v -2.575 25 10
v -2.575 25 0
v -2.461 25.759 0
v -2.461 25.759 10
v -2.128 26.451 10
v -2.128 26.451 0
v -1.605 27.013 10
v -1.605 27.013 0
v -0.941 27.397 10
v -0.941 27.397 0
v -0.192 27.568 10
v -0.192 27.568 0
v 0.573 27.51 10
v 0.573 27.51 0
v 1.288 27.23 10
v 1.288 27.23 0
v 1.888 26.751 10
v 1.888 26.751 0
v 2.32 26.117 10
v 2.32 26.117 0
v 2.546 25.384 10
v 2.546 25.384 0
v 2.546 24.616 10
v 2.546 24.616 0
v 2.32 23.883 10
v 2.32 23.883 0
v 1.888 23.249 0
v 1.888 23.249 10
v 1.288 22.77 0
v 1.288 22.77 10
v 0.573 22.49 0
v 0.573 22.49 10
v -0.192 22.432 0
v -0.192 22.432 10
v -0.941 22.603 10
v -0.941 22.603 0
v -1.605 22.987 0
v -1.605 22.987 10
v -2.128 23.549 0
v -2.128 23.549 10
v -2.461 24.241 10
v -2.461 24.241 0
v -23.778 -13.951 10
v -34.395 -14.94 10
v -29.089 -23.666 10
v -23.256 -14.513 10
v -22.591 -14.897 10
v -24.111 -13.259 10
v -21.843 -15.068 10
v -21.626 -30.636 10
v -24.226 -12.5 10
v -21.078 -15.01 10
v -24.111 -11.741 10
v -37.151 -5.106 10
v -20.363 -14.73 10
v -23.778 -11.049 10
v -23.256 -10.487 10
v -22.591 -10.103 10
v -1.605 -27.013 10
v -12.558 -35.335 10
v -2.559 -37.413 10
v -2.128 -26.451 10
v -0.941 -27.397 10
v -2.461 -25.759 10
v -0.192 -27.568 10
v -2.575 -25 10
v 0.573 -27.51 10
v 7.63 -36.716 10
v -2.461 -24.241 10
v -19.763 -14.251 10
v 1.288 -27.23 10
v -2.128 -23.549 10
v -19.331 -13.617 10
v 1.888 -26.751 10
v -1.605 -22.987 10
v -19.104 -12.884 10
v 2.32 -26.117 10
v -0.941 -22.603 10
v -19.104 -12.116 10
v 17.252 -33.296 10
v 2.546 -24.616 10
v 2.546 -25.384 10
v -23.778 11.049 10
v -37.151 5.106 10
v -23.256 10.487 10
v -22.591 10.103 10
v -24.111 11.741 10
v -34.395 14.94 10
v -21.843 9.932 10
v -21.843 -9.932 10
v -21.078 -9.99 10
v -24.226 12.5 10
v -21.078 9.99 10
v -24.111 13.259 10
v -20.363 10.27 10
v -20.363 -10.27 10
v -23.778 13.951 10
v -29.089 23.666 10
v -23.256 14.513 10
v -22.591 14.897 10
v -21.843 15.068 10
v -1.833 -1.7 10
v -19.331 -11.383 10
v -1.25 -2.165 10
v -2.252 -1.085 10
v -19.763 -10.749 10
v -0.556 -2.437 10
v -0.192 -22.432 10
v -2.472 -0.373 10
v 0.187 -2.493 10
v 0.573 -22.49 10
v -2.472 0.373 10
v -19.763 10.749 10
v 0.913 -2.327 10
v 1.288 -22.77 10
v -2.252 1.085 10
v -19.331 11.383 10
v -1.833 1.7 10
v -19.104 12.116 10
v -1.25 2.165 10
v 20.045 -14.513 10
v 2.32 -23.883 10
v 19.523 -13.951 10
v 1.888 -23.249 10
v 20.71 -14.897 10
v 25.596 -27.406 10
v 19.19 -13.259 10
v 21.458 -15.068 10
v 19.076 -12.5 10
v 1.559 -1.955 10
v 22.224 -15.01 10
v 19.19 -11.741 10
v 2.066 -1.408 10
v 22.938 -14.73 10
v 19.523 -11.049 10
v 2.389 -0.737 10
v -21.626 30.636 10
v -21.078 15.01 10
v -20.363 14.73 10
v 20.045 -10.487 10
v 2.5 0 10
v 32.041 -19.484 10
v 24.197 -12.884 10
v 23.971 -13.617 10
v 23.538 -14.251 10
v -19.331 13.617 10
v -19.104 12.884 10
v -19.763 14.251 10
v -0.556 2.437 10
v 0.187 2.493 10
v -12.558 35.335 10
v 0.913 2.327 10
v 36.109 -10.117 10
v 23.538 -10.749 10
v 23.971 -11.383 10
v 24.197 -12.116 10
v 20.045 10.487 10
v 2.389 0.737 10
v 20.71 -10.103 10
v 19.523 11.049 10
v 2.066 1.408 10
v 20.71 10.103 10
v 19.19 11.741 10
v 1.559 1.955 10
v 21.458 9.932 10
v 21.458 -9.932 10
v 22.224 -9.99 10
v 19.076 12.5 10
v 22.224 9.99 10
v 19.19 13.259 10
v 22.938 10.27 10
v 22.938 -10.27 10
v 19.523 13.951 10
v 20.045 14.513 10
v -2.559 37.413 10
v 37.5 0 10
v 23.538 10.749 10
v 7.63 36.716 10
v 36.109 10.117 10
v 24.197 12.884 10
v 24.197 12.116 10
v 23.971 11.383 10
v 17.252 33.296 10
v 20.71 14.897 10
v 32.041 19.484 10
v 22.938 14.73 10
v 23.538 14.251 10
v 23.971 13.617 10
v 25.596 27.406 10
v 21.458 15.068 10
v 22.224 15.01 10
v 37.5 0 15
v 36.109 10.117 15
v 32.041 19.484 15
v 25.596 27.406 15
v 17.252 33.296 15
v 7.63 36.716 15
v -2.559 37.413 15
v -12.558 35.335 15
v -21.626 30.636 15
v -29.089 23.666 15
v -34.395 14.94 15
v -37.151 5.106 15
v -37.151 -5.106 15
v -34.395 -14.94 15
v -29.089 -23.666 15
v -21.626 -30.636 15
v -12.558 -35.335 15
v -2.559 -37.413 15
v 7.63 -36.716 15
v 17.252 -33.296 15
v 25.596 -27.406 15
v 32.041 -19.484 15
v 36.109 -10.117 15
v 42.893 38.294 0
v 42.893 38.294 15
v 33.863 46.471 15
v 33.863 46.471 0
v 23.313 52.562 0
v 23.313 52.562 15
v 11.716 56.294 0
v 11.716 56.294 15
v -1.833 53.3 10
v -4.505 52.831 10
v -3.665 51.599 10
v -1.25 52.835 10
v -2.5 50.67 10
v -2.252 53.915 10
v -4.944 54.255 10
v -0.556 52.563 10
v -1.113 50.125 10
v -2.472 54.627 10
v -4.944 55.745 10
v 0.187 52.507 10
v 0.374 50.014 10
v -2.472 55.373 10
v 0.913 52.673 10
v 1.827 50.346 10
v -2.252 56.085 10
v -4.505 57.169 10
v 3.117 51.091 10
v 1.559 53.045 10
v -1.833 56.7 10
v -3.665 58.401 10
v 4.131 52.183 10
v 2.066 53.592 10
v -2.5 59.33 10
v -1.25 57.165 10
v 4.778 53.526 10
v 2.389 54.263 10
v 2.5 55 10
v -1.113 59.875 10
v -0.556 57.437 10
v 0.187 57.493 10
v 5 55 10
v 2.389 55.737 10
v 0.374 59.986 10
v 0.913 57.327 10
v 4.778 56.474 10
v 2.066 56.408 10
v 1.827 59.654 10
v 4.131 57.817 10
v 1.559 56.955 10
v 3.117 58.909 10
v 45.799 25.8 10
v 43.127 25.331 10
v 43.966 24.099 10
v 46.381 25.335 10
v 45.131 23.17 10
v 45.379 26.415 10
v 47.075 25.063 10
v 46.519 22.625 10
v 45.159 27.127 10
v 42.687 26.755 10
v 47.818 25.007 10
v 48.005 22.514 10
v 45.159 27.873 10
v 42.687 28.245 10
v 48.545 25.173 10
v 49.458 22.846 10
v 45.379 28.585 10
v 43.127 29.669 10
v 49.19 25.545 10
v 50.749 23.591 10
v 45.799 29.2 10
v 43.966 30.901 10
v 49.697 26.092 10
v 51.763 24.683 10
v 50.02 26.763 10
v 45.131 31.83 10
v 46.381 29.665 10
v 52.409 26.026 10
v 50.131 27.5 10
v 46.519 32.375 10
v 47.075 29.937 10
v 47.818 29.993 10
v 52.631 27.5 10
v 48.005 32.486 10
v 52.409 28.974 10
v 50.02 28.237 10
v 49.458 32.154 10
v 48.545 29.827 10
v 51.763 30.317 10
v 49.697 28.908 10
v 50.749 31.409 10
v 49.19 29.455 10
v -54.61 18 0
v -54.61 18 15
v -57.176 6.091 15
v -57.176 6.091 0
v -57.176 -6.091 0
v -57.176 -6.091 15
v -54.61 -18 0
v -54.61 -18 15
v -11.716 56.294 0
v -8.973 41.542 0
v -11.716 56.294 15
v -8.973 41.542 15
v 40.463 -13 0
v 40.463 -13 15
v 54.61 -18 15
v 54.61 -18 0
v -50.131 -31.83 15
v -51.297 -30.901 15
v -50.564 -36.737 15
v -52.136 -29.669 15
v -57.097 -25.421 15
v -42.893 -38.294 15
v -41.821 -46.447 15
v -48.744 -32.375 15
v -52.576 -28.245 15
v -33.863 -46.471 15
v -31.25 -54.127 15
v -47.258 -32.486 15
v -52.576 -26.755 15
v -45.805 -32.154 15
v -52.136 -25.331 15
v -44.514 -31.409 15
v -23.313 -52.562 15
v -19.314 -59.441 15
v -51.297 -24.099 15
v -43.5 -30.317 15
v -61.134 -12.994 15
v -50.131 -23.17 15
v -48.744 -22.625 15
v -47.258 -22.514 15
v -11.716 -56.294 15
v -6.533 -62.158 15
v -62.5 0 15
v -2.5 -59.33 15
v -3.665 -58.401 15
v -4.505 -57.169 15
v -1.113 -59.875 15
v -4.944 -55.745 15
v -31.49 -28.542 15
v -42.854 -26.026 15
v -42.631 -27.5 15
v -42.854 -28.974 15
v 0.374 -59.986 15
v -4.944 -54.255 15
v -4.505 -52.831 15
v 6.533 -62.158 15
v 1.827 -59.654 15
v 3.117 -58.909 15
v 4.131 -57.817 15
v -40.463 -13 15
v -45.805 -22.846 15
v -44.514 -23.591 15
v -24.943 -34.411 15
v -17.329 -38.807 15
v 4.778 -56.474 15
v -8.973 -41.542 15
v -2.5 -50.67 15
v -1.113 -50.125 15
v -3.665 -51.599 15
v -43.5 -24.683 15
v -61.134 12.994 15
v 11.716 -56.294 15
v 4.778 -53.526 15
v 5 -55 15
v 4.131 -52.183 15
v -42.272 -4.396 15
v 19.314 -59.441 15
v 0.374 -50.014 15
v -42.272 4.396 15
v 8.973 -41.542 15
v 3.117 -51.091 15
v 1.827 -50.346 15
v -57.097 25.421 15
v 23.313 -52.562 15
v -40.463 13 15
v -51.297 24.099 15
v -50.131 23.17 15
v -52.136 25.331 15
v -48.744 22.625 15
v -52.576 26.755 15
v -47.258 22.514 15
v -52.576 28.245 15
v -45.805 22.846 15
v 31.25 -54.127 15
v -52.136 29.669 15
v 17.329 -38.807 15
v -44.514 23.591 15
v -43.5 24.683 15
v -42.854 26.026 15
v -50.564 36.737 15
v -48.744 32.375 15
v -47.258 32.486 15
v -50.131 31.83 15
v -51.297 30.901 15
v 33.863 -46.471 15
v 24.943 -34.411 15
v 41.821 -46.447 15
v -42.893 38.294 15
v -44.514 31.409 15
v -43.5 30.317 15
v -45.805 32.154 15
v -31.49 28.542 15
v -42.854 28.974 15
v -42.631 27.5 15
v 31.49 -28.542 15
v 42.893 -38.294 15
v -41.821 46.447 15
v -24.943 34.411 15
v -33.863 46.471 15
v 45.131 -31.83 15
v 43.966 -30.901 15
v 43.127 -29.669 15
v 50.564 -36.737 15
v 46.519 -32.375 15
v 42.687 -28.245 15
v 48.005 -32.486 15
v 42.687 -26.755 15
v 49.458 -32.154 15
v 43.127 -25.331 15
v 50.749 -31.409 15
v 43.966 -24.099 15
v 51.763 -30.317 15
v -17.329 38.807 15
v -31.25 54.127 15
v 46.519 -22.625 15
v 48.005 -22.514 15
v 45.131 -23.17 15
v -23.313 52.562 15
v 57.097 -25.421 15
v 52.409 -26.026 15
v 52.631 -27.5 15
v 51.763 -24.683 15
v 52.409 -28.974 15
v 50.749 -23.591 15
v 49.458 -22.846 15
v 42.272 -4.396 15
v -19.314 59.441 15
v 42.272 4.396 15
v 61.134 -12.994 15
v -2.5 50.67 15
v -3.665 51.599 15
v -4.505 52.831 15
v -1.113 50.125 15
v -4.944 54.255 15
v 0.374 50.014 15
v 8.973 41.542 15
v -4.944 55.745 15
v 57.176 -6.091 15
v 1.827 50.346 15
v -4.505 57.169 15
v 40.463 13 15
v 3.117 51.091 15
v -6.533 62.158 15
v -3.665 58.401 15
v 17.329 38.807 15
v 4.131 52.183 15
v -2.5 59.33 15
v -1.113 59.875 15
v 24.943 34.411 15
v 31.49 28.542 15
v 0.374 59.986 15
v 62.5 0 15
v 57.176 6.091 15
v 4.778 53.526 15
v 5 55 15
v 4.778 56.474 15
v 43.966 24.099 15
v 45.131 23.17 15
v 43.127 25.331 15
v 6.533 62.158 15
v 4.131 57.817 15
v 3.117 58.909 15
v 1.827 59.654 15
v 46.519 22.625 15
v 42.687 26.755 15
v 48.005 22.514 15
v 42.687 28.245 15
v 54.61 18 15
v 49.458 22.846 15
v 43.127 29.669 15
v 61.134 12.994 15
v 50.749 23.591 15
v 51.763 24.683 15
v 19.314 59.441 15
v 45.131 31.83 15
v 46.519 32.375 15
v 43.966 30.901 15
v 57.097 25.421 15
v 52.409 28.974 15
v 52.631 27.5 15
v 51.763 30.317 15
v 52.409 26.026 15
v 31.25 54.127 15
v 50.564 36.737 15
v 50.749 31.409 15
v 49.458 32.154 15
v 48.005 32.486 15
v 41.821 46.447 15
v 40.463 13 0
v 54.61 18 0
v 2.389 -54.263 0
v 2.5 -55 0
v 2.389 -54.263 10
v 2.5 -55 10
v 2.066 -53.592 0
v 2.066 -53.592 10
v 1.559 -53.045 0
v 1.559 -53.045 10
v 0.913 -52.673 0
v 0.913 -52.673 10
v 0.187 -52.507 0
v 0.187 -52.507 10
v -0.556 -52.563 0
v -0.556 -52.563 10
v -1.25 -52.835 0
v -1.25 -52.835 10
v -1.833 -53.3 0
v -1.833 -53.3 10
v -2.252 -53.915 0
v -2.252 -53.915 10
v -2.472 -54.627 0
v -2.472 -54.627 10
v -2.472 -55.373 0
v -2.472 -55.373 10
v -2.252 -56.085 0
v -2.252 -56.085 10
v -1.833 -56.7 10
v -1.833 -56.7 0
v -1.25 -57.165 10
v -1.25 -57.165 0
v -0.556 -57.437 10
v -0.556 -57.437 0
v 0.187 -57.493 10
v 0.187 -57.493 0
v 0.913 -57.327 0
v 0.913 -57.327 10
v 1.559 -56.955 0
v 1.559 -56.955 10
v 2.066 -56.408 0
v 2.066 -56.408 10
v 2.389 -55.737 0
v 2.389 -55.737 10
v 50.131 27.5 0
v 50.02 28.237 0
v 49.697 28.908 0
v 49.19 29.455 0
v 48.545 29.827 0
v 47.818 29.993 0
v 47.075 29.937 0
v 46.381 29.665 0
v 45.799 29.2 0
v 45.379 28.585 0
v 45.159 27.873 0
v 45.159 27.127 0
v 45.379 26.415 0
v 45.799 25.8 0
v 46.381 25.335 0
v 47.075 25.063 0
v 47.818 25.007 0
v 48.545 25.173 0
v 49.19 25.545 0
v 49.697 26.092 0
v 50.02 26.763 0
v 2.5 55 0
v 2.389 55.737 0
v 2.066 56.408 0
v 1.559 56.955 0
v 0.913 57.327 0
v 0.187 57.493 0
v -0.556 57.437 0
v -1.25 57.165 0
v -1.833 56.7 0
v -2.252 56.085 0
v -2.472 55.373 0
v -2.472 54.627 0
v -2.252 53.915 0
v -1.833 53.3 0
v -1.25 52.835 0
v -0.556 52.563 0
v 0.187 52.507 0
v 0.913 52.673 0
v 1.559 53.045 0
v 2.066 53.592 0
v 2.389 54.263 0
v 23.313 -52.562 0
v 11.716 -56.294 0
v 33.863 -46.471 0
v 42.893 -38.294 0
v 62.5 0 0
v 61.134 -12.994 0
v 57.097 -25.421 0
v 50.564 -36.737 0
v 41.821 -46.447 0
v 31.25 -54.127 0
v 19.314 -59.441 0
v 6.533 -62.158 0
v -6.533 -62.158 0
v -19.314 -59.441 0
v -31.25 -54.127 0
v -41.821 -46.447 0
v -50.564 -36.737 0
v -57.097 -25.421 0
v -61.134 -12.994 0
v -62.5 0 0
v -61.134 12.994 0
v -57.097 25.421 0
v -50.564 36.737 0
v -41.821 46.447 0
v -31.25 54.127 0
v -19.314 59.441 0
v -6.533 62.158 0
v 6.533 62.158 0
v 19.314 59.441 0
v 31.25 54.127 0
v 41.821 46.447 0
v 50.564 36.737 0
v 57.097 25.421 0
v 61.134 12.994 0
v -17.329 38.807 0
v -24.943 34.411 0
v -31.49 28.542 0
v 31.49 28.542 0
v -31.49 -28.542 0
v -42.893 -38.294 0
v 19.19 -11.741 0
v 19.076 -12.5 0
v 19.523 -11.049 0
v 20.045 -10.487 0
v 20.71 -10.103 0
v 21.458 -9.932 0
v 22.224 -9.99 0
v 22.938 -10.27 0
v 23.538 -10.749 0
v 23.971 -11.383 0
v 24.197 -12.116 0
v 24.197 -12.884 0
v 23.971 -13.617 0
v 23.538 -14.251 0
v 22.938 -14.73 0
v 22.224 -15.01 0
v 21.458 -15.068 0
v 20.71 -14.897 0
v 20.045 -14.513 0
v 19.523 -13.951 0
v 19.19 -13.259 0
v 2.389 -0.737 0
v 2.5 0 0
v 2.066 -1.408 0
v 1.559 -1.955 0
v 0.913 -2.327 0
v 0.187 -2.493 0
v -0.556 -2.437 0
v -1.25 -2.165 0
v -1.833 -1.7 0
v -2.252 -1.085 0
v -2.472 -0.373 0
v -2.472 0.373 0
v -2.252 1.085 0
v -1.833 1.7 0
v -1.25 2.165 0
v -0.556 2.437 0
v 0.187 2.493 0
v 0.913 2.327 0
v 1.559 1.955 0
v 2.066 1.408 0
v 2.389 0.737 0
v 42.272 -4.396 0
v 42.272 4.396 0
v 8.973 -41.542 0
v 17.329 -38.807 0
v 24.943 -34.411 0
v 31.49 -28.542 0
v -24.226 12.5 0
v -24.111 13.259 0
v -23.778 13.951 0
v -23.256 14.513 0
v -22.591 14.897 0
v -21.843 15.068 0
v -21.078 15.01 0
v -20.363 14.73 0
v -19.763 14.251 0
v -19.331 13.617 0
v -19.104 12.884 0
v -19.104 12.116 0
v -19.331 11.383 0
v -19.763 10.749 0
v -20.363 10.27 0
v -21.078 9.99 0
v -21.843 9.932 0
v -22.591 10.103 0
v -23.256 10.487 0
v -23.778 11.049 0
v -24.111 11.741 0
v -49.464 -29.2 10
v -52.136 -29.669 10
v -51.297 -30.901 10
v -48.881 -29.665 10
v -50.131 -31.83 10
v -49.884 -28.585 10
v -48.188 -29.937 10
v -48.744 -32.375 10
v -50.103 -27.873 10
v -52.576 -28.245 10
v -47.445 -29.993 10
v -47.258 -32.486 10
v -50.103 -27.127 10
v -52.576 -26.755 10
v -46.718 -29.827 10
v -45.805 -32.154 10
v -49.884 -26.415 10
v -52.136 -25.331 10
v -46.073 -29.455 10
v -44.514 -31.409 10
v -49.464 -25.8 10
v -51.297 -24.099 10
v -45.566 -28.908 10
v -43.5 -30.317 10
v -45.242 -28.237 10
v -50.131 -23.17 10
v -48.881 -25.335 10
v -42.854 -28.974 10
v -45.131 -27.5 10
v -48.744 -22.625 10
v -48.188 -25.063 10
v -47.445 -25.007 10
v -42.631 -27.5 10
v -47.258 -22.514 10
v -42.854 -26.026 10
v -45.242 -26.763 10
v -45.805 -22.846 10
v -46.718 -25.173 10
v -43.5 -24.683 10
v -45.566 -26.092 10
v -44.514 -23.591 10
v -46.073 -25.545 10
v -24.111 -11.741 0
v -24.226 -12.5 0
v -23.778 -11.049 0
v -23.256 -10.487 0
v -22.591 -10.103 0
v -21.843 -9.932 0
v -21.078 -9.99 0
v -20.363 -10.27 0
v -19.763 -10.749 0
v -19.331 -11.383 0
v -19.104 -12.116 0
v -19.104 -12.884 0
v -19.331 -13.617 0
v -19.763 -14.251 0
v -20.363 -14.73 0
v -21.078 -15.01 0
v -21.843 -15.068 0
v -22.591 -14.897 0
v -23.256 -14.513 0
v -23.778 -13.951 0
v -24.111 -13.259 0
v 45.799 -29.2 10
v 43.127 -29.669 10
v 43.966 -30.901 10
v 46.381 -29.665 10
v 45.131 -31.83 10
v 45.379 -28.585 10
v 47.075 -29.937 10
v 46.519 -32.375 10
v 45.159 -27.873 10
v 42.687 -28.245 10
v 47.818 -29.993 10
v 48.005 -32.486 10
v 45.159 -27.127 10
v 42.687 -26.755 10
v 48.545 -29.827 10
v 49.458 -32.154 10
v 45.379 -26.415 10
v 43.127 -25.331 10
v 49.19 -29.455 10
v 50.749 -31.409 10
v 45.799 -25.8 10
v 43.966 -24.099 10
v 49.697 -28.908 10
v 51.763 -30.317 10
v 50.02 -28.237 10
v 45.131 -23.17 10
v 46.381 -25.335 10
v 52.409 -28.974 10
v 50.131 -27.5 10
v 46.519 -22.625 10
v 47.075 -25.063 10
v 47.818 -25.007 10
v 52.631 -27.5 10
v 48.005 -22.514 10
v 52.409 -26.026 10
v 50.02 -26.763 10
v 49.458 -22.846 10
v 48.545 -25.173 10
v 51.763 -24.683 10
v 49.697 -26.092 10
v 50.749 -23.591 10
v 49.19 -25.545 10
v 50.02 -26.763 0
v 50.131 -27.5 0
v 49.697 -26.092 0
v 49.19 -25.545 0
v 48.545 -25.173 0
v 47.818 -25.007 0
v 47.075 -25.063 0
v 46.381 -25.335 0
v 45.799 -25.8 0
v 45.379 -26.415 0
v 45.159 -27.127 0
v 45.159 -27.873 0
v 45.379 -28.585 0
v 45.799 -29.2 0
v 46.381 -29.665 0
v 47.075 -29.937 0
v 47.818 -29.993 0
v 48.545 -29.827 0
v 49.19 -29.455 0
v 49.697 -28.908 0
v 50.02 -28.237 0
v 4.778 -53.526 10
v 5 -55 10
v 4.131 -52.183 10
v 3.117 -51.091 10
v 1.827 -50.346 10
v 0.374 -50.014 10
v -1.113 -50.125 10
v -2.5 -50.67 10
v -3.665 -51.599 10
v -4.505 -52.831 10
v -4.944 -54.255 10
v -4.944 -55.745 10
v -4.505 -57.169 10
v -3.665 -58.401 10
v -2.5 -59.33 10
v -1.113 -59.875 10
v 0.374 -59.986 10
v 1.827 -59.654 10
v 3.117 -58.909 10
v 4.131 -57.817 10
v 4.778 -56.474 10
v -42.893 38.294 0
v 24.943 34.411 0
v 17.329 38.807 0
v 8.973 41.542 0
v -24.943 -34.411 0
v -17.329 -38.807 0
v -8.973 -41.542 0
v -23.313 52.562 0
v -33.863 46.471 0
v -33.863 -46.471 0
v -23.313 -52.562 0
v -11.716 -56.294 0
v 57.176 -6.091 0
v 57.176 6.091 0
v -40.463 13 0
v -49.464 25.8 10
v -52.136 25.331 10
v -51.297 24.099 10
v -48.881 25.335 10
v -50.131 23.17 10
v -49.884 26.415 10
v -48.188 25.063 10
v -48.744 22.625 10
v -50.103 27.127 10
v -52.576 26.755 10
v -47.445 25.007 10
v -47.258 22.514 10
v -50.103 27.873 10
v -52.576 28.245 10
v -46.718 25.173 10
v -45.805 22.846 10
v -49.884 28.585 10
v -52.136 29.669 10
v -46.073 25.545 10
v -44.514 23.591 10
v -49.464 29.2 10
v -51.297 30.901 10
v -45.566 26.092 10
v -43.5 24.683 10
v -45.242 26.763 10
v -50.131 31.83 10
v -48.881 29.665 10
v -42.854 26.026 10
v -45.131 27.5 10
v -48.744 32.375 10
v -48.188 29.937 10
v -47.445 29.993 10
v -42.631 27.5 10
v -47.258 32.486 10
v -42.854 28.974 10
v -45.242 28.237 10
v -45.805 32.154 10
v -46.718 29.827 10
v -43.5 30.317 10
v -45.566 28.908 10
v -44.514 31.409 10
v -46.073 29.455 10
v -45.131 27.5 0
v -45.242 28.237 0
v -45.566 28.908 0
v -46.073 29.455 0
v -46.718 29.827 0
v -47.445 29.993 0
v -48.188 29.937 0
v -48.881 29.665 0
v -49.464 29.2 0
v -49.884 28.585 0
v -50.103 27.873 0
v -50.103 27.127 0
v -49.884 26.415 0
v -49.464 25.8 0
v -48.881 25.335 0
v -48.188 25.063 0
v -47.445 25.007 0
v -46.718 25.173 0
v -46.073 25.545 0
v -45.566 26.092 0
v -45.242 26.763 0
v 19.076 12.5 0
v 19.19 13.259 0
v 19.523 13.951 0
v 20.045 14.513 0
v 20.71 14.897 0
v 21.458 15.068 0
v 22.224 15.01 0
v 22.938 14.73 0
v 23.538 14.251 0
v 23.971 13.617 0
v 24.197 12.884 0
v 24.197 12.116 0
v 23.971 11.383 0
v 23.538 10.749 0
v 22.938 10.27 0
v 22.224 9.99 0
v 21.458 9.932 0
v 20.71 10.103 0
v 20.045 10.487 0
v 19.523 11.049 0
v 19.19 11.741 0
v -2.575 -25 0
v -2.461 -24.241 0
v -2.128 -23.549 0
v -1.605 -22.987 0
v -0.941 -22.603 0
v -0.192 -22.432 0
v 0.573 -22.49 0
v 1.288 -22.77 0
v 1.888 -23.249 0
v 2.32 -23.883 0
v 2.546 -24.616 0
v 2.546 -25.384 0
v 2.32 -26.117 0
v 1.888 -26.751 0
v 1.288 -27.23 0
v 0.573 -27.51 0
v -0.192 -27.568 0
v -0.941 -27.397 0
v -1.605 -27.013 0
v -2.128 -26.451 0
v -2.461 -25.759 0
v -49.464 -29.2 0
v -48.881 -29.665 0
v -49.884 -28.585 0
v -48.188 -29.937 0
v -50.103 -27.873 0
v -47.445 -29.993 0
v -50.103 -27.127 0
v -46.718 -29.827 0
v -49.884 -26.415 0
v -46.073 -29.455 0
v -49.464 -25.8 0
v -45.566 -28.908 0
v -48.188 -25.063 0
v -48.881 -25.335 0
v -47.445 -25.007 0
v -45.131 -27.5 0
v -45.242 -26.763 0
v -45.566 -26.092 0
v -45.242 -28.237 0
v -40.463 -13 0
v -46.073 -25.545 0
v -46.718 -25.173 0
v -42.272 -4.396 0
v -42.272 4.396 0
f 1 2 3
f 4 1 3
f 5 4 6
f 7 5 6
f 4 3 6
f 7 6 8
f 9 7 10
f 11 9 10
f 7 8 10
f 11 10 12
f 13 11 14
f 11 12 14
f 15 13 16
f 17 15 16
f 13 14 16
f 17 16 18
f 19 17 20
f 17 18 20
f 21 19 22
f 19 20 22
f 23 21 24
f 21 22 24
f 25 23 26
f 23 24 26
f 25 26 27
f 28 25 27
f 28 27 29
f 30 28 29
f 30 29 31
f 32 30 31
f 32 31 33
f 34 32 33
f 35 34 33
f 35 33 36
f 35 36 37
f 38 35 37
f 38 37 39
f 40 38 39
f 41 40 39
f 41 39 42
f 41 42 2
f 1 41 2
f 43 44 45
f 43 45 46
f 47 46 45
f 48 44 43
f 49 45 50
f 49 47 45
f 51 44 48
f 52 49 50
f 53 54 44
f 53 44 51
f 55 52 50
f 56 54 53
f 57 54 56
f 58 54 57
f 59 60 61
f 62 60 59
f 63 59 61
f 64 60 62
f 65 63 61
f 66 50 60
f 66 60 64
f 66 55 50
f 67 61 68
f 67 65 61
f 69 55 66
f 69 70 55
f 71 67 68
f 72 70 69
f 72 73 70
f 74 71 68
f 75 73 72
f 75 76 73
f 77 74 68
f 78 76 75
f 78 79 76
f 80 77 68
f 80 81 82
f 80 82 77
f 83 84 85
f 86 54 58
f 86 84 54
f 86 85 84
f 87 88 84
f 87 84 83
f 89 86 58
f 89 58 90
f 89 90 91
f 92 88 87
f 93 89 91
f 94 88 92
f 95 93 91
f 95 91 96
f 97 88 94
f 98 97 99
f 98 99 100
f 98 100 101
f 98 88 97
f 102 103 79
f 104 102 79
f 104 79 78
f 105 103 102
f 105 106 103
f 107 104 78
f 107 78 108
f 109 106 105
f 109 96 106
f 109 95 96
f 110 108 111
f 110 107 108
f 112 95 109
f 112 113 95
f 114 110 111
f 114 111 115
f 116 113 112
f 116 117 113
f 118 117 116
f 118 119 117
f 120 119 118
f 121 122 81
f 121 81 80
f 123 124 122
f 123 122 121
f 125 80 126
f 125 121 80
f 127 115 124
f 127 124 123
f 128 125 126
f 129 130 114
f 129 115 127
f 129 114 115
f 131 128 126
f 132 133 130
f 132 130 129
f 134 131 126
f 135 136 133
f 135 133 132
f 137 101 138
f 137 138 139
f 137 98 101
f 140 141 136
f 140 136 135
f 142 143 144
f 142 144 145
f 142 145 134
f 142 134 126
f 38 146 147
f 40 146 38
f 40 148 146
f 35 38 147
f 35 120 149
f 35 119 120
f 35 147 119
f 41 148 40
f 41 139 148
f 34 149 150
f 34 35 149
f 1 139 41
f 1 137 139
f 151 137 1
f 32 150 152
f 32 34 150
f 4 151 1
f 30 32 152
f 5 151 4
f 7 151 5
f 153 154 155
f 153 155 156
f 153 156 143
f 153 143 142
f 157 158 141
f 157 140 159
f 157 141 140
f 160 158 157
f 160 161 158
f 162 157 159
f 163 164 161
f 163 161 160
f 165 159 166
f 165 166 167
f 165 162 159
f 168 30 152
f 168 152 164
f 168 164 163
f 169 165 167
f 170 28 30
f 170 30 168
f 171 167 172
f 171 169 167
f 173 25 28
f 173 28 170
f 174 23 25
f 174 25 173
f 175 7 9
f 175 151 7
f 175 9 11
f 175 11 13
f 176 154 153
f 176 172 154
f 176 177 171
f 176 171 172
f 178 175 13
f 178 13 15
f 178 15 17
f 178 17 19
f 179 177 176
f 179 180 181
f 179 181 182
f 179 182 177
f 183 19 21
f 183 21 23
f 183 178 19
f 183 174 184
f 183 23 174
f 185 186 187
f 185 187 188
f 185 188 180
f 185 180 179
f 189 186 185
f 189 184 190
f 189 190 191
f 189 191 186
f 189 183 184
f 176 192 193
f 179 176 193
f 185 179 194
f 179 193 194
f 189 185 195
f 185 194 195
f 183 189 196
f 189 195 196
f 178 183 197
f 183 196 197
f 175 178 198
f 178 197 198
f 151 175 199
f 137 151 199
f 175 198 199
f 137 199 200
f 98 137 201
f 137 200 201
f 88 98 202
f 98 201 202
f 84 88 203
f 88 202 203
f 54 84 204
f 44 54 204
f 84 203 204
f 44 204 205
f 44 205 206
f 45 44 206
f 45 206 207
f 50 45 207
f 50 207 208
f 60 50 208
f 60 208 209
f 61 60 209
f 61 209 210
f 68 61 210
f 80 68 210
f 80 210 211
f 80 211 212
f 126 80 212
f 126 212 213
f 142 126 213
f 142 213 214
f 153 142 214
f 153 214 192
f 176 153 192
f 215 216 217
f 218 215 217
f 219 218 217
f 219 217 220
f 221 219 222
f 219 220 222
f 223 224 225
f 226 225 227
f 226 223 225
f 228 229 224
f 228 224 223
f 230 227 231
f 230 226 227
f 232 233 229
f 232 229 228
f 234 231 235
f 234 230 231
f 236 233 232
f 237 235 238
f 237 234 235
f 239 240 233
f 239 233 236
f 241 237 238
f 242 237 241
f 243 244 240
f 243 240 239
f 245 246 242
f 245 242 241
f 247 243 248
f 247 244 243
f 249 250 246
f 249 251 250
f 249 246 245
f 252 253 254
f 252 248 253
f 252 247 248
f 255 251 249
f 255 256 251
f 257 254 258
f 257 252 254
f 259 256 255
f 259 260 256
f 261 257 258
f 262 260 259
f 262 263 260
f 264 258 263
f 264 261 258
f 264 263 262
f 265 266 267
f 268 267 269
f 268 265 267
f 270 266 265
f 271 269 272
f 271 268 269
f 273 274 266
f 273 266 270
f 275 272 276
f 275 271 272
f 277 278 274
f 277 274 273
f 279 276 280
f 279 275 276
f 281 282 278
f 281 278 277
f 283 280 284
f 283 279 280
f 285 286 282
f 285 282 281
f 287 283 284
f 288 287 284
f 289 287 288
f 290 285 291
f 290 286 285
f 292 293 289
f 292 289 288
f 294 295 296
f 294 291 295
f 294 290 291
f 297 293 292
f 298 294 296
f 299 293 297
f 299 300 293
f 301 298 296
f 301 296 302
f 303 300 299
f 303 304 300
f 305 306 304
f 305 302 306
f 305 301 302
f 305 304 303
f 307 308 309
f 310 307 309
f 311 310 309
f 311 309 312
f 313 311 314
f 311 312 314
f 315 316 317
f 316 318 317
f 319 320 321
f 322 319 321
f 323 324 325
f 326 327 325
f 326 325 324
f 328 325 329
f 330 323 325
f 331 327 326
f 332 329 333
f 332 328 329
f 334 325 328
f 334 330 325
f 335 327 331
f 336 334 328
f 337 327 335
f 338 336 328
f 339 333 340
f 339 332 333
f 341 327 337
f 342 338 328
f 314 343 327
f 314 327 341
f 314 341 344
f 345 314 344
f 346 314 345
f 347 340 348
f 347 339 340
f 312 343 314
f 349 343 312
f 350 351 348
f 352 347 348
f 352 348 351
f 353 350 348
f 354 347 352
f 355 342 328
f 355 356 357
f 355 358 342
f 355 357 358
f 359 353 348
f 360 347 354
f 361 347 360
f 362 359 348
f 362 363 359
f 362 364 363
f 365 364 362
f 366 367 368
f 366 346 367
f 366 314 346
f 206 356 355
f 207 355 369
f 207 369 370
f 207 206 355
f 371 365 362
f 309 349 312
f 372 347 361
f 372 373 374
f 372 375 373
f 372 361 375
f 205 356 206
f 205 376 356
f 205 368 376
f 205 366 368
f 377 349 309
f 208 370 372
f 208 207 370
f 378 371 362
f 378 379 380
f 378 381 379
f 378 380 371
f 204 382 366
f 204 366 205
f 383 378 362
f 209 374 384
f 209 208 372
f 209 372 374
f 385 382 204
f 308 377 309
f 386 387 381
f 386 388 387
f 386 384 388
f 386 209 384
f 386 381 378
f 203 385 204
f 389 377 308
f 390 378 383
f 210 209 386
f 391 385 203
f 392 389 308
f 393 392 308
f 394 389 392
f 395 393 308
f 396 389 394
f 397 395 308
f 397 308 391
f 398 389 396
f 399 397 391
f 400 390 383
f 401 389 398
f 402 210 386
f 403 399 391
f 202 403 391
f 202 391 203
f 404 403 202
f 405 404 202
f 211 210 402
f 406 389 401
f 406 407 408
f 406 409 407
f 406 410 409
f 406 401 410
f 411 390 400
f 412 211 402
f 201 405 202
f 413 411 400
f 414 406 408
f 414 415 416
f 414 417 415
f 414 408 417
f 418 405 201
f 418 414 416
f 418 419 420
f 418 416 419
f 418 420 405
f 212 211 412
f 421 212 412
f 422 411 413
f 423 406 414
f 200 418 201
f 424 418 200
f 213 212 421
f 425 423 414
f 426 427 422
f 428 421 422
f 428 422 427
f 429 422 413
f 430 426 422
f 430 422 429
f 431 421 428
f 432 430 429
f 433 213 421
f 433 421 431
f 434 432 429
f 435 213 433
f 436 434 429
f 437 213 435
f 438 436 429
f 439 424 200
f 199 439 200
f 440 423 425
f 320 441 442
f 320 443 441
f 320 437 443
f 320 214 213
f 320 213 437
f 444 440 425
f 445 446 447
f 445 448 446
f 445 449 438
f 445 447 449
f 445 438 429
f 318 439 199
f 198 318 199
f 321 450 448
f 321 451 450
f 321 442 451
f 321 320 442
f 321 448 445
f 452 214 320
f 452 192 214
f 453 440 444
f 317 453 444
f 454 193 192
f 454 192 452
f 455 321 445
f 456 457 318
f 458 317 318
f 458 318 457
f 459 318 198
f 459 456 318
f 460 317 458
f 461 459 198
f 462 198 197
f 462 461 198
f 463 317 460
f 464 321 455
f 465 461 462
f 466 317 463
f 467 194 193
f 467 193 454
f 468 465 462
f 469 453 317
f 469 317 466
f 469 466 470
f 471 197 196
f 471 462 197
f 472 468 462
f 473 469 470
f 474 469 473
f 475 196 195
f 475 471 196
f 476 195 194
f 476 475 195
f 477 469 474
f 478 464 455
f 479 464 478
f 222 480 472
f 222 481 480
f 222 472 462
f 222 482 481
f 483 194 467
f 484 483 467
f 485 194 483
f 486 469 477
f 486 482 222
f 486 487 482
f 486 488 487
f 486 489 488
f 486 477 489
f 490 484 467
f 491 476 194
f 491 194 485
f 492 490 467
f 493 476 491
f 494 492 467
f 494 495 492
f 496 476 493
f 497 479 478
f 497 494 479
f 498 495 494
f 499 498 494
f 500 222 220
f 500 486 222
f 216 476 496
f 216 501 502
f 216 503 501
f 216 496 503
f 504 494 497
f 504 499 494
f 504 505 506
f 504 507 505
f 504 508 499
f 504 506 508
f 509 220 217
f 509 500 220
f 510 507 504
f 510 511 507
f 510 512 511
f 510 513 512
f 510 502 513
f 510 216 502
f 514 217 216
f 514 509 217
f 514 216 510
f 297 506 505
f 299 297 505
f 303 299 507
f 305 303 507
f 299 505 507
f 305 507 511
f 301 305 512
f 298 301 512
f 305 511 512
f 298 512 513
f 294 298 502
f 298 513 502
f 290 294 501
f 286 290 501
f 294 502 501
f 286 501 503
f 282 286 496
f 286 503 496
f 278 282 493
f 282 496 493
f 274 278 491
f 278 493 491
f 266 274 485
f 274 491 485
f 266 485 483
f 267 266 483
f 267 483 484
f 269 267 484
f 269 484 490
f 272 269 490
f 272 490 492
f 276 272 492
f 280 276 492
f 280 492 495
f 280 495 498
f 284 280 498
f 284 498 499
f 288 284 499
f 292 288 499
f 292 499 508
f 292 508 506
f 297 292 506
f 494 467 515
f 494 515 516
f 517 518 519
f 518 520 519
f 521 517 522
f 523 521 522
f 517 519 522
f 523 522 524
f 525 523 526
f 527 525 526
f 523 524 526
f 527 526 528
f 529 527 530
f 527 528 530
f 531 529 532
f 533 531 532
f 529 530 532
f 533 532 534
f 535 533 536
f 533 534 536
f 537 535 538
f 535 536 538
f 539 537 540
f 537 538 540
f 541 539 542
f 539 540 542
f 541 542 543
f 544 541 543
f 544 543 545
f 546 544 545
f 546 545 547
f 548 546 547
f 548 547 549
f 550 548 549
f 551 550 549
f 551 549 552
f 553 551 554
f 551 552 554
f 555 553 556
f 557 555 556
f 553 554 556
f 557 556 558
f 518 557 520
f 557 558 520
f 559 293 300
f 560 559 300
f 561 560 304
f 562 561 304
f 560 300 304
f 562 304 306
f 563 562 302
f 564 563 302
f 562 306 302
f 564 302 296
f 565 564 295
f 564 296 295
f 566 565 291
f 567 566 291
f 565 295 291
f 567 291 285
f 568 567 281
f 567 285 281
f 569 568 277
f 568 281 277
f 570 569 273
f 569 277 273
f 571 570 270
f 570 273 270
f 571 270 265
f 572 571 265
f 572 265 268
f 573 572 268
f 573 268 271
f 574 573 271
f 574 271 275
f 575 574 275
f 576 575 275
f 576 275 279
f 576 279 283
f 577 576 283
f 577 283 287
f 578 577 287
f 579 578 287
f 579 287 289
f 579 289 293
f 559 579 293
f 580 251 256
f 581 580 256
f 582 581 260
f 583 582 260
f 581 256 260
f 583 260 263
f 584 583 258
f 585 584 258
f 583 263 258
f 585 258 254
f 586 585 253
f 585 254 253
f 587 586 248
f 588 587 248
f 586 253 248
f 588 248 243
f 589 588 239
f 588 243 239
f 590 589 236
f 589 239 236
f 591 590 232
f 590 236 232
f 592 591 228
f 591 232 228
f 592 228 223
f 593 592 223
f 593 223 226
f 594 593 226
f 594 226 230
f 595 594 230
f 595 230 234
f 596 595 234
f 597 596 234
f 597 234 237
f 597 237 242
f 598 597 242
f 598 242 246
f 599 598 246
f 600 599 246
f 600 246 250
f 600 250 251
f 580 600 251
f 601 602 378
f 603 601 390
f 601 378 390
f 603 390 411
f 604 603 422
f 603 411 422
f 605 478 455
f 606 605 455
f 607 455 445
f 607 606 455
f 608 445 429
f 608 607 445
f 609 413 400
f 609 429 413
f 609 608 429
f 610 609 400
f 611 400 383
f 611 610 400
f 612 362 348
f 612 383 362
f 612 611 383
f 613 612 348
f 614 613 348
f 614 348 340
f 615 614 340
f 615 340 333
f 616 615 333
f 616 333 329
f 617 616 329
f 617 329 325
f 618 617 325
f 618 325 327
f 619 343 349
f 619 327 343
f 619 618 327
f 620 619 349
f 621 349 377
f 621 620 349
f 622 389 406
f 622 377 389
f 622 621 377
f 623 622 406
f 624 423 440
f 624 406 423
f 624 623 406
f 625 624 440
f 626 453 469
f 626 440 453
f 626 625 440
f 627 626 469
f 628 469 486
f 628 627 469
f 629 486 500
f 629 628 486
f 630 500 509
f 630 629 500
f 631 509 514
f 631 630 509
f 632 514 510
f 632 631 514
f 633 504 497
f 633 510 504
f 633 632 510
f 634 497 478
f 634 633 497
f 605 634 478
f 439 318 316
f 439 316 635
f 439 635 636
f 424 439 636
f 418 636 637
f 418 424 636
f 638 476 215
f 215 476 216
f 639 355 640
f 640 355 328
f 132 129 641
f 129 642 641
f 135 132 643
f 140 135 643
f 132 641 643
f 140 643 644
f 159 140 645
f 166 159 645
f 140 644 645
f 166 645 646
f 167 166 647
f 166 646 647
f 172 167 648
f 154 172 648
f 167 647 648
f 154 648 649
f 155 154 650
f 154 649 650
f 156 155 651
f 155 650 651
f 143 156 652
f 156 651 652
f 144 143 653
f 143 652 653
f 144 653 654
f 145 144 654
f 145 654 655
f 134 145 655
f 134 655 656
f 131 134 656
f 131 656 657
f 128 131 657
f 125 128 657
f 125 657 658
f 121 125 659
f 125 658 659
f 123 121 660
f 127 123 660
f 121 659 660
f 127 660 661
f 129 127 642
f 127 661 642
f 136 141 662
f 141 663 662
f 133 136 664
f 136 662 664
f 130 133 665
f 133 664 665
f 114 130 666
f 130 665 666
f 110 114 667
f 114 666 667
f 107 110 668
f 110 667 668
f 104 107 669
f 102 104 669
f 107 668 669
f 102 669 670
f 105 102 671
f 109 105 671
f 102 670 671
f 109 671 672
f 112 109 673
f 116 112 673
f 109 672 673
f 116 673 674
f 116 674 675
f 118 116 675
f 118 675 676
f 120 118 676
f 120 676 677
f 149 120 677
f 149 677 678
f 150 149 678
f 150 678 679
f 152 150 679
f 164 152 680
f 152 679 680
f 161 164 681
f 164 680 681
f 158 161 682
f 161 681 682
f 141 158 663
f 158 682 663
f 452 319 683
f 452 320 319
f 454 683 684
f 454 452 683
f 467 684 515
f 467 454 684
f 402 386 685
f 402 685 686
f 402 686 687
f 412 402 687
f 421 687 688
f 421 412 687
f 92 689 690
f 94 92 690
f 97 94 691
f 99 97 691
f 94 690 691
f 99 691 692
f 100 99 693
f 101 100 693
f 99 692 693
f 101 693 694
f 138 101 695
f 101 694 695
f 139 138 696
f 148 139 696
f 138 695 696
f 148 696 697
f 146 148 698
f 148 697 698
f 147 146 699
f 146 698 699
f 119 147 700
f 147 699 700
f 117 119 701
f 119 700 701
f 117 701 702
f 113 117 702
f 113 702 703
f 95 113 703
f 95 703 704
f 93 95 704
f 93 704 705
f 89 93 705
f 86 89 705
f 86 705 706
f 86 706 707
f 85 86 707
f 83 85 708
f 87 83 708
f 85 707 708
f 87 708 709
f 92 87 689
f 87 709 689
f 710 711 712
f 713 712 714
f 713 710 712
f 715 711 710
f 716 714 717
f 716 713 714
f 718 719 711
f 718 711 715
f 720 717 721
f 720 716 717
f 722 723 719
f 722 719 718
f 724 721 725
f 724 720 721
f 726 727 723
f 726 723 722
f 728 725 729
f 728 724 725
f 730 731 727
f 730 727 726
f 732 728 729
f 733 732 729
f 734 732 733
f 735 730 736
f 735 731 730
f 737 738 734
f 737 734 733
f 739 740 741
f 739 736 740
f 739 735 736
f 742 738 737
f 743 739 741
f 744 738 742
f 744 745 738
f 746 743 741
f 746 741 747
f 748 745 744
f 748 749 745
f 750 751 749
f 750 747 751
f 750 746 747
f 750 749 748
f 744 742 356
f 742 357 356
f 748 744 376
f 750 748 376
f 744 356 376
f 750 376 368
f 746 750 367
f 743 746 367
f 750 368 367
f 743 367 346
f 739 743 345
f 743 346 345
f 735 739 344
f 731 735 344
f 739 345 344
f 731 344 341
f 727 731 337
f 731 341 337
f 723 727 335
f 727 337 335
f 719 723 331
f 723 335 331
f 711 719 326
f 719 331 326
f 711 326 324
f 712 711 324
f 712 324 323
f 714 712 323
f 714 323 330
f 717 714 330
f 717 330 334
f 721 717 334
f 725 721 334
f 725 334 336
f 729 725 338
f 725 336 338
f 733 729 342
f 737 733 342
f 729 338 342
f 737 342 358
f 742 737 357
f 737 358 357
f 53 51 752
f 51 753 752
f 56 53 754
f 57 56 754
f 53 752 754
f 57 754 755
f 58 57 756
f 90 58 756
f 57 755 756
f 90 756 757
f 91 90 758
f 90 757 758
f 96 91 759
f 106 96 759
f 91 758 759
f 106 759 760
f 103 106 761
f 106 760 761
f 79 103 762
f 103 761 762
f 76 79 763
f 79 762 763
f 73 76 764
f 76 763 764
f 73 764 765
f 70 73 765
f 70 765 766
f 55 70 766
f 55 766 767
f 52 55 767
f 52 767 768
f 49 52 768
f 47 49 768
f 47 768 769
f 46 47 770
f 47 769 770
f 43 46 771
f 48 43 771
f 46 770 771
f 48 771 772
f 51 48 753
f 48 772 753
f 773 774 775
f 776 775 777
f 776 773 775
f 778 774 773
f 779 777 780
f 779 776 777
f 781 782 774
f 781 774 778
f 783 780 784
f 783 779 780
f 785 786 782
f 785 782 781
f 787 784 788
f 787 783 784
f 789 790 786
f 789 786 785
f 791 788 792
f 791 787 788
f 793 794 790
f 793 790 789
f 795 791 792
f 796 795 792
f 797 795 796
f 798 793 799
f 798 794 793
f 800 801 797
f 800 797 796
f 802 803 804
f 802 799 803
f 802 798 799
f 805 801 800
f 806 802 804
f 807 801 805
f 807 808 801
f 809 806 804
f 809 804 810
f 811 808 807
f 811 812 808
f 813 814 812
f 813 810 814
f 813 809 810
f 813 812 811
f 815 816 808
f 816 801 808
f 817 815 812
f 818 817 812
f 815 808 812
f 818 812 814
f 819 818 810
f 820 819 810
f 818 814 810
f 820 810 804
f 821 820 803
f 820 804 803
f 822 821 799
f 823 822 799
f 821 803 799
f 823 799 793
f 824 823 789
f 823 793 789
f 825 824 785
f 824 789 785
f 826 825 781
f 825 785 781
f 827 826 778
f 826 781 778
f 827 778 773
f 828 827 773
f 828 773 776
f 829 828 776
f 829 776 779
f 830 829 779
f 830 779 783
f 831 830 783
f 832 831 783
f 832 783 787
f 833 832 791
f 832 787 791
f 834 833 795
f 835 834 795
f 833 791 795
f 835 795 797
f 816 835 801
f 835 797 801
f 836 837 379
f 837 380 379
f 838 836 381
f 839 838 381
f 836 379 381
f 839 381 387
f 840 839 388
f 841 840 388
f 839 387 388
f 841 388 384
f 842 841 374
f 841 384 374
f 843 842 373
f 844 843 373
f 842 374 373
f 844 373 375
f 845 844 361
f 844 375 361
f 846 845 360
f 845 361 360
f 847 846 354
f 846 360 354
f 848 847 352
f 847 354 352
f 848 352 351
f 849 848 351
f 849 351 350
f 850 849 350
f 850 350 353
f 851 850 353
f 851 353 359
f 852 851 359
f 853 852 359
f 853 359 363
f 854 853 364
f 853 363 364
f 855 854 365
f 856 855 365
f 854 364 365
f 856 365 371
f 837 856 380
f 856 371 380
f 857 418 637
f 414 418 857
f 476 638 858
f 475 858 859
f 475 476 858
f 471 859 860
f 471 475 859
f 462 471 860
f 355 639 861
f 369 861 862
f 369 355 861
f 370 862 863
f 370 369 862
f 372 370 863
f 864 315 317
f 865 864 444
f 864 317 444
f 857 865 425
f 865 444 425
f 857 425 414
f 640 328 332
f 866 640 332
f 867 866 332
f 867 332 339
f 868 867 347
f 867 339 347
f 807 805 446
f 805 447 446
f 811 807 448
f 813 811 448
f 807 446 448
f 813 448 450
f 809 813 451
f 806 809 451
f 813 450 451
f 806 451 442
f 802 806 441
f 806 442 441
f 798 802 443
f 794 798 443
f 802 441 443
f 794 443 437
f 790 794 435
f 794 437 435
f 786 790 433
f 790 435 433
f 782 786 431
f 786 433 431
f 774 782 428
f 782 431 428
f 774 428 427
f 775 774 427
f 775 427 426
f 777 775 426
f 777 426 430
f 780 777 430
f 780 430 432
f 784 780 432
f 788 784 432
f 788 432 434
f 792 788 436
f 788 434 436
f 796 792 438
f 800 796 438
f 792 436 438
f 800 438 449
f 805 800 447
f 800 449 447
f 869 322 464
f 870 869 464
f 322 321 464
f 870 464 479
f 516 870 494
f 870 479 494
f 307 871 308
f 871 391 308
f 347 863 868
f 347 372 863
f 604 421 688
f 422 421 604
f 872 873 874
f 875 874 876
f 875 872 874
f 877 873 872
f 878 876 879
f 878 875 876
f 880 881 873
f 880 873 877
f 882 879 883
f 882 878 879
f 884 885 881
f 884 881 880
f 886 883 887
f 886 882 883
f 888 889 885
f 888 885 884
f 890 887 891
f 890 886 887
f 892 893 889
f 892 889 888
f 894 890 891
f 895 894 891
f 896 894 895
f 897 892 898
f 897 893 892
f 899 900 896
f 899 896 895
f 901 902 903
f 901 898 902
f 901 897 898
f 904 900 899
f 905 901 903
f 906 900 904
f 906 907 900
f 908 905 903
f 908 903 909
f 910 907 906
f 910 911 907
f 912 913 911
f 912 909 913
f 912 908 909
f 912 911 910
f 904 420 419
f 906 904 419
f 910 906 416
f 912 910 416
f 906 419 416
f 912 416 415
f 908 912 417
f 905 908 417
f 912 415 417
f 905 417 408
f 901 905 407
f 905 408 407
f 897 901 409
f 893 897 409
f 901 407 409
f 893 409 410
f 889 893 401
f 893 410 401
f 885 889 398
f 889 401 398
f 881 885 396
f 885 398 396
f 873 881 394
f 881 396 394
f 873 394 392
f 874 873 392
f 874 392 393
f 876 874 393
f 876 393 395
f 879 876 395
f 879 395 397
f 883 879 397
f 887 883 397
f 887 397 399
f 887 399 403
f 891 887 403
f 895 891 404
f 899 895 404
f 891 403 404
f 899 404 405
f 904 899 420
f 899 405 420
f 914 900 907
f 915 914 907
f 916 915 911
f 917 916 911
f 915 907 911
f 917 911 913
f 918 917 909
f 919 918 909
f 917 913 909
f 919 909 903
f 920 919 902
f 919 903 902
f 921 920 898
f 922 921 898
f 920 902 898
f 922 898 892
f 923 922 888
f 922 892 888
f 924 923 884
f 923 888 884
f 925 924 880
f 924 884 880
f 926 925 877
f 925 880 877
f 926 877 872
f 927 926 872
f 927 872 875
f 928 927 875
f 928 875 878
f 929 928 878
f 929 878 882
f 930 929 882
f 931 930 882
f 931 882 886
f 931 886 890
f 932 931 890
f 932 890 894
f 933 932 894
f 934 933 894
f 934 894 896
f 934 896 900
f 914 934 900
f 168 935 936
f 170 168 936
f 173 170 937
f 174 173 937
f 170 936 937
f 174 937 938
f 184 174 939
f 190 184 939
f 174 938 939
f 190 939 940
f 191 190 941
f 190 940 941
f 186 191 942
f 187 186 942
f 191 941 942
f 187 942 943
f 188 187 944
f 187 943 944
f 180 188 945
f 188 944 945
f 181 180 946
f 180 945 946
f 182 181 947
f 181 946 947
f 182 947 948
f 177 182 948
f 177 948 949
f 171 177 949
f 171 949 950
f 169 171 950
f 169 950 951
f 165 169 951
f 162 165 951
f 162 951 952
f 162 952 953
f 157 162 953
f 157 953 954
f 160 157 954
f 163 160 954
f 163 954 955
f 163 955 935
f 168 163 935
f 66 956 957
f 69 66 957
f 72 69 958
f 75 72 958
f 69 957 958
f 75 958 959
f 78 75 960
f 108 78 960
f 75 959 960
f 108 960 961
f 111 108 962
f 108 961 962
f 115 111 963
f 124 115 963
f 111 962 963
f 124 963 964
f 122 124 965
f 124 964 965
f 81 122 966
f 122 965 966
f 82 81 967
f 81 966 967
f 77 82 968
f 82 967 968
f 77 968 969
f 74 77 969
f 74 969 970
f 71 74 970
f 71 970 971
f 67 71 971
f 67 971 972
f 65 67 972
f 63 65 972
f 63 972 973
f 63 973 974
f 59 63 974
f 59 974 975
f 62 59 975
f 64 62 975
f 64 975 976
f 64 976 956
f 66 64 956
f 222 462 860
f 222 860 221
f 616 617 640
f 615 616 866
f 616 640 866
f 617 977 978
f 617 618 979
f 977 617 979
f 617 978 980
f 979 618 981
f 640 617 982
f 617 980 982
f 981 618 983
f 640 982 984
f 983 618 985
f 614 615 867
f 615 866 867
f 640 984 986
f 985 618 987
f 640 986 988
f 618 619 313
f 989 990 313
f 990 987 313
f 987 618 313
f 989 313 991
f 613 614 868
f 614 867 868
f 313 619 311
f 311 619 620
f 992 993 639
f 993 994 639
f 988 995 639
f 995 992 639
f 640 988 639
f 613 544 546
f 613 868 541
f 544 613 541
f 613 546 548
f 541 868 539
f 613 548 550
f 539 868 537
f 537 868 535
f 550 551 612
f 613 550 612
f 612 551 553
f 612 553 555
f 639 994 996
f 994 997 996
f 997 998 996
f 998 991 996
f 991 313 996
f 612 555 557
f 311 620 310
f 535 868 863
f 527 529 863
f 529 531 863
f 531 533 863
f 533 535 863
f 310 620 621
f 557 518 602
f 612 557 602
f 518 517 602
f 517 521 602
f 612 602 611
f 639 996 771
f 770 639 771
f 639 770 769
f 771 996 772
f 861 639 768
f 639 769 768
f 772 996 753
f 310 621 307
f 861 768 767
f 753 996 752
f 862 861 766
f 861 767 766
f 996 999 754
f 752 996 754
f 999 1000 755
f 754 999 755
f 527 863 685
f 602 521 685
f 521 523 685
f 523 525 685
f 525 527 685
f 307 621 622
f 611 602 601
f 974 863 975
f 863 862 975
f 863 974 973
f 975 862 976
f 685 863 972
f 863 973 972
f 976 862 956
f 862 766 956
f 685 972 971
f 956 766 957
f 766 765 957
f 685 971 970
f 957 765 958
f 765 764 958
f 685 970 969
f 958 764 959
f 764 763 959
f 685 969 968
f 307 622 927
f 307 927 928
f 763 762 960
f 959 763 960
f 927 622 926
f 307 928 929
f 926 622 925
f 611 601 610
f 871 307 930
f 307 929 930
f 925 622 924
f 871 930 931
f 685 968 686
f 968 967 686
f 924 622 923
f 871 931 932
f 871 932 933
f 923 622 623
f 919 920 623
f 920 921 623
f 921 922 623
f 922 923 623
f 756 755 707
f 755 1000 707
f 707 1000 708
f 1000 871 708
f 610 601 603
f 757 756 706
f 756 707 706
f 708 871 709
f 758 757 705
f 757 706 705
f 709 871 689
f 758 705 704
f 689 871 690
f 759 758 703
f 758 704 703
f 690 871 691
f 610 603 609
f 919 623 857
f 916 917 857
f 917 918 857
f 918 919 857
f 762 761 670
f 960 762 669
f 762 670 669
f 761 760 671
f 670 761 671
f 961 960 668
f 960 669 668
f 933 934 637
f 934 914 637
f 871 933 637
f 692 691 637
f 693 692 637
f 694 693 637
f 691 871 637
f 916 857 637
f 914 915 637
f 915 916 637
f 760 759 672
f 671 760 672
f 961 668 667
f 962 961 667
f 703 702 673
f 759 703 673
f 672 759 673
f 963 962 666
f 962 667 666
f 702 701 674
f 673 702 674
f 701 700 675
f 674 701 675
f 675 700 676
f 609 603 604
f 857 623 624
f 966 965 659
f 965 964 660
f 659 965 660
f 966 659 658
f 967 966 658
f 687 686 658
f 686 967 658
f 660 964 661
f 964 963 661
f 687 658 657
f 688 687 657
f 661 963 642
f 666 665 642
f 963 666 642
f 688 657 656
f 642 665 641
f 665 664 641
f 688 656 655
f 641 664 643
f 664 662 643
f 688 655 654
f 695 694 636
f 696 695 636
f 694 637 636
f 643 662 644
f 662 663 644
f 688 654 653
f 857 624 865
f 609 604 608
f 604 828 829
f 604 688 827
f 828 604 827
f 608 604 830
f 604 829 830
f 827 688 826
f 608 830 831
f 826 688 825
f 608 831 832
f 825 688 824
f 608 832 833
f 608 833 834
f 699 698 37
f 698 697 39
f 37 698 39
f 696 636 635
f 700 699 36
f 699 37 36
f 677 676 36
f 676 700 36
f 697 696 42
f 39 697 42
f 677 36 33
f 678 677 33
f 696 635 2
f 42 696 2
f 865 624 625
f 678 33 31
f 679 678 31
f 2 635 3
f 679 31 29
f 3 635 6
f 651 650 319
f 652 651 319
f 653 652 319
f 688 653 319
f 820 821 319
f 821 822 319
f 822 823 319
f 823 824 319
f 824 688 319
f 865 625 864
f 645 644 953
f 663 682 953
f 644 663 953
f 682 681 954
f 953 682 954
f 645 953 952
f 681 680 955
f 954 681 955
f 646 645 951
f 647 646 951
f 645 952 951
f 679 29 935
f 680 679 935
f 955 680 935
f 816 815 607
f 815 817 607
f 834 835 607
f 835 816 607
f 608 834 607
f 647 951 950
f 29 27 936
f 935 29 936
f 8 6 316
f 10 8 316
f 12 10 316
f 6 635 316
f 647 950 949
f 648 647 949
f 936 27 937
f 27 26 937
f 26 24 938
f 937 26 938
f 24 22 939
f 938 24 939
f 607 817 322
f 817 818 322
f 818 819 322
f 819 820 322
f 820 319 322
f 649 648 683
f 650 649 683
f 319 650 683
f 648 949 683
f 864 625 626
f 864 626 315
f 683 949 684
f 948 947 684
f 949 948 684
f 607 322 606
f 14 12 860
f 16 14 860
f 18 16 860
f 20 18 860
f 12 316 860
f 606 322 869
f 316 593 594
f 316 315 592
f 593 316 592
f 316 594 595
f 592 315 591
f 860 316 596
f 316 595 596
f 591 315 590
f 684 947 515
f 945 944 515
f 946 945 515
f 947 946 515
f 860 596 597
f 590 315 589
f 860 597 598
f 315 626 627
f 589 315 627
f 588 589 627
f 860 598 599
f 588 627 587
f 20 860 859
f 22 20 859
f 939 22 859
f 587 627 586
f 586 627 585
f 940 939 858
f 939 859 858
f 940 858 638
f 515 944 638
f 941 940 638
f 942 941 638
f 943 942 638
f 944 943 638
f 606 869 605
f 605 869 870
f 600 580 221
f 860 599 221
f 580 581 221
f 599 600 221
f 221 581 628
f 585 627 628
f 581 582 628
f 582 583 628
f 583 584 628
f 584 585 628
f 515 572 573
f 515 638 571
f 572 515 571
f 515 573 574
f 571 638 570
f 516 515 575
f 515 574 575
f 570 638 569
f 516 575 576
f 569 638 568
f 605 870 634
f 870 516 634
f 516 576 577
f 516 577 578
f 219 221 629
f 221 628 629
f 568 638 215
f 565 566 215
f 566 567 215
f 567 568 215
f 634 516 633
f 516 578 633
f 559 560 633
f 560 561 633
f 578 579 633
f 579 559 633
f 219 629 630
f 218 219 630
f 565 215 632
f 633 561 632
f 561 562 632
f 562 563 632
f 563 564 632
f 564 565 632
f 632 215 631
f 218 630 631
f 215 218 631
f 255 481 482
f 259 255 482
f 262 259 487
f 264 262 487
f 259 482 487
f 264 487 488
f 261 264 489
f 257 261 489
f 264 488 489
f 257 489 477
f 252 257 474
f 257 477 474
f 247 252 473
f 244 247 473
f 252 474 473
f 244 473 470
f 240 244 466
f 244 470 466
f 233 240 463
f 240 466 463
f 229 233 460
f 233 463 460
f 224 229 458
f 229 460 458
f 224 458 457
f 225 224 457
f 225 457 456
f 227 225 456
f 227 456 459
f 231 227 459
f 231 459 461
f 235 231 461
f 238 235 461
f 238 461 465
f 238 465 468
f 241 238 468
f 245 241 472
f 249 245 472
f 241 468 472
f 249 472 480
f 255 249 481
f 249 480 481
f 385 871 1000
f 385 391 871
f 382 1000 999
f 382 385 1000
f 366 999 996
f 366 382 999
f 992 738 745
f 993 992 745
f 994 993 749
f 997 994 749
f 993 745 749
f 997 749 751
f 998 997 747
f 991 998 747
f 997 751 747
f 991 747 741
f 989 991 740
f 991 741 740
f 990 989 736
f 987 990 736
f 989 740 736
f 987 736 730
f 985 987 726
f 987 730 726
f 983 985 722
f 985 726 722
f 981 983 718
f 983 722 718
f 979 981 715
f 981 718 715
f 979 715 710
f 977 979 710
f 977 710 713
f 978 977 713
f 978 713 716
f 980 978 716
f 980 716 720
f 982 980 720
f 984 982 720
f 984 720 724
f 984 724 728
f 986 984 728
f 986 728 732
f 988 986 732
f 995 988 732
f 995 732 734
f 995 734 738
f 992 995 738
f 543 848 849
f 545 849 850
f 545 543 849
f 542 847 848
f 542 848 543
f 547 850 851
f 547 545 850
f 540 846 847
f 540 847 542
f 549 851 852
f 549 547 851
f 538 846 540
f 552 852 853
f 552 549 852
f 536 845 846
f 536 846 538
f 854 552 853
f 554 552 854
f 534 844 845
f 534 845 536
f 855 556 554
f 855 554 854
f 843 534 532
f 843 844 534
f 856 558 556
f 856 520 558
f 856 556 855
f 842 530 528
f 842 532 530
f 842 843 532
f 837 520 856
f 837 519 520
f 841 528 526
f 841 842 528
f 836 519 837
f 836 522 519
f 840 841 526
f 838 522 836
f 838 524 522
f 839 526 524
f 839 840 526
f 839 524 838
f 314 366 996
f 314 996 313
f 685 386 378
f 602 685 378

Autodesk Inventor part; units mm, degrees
ref_plane "YZ Plane" through (0, 0, 0) normal (1, 0, 0) x (0, 1, 0)
ref_plane "XZ Plane" through (0, 0, 0) normal (0, 1, 0) x (-1, 0, 0)
ref_plane "XY Plane" through (0, 0, 0) normal (0, 0, 1) x (1, 0, 0)
sketch "Sketch2" plane through (0, 0, 0) normal (0, 0, 1) x (1, 0, 0)
  circle A0 centre (0, 0) radius 62.5
  circle A1 centre (0, 0) radius 2.5
  dimension "d0" = 125
  dimension "d1" = 5
extrude "Extrusion1" add sketch "Sketch2" along normal blind 15
sketch "Sketch4" plane through (0, 0, 0) normal (0, 0, -1) x (-1, 0, 0)
  circle A0 centre (0, 25) radius 2.575
  circle A1 centre (-21.6506, 12.5) radius 2.575
  circle A2 centre (-21.6506, -12.5) radius 2.575
  circle A3 centre (0, -25) radius 2.575
  circle A4 centre (21.6506, -12.5) radius 2.575
  circle A5 centre (21.6506, 12.5) radius 2.575
  point P0 (0, 0)
  dimension "d8" = 5.15
  dimension "d9" = 25
  dimension "d12" = 360
extrude "Extrusion3" cut sketch "Sketch4" against normal through all
sketch "Sketch5" plane through (0, 0, 15) normal (0, 0, 1) x (1, 0, 0)
  circle A0 centre (0, 0) radius 37.5
  dimension "d16" = 75
extrude "Extrusion4" cut sketch "Sketch5" against normal blind 5
sketch "Sketch6" plane through (0, 0, 15) normal (0, 0, 1) x (1, 0, 0)
  circle A0 centre (0, 55) radius 2.5
  circle A1 centre (-47.6314, 27.5) radius 2.5
  circle A2 centre (-47.6314, -27.5) radius 2.5
  circle A3 centre (0, -55) radius 2.5
  circle A4 centre (47.6314, -27.5) radius 2.5
  circle A5 centre (47.6314, 27.5) radius 2.5
  point P0 (0, 0)
  dimension "d19" = 5
  dimension "d20" = 55
  dimension "d23" = 360
extrude "Extrusion5" cut sketch "Sketch6" against normal through all
sketch "Sketch8" plane through (0, 0, 15) normal (0, 0, 1) x (1, 0, 0)
  circle A0 centre (0, 0) radius 37.5 projected
  circle A1 centre (0, 0) radius 62.5 projected
  circle A2 centre (0, 55) radius 2.5 projected
  circle A3 centre (0, 55) radius 5
  circle A4 centre (-47.6314, 27.5) radius 5
  circle A5 centre (-47.6314, -27.5) radius 5
  circle A6 centre (0, -55) radius 5
  circle A7 centre (47.6314, -27.5) radius 5
  circle A8 centre (47.6314, 27.5) radius 5
  point P0 (-56.2917, 32.5)
  point P1 (-56.2917, -32.5)
  point P2 (0, -65)
  point P3 (56.2917, -32.5)
  point P4 (56.2917, 32.5)
  dimension "d28" = 10
  dimension "d31" = 360
extrude "Extrusion6" cut sketch "Sketch8" against normal blind 5 contours A2 | A3 | A4 | A5 | A6 | A7 | A8
sketch "Sketch9" plane through (0, 0, 15) normal (0, 0, 1) x (1, 0, 0)
  circle A0 centre (0, 0) radius 2.5 construction
  circle A1 centre (0, 0) radius 42.5 construction
  circle A2 centre (0, 0) radius 57.5 construction
  line L0 (40.4629, 13) -> (54.61, 18)
  line L1 (40.4629, -13) -> (54.61, -18)
  line L2 (0, 0) -> (92.9665, 0) construction
  arc A3 (40.4629, -13) -> (40.4629, 13) centre (0, 0) ccw
  arc A4 (54.61, -18) -> (54.61, 18) centre (0, 0) ccw
  circle A5 centre (0, 0) radius 42.5 construction
  line L3 (8.9731, 41.5419) -> (11.7165, 56.2936)
  arc A6 (31.4898, 28.5419) -> (8.9731, 41.5419) centre (0, 0) ccw
  line L4 (31.4898, 28.5419) -> (42.8934, 38.2936)
  circle A7 centre (0, 0) radius 57.5 construction
  arc A8 (42.8934, 38.2936) -> (11.7165, 56.2936) centre (0, 0) ccw
  circle A9 centre (0, 0) radius 42.5 construction
  line L5 (-31.4898, 28.5419) -> (-42.8934, 38.2936)
  arc A10 (-8.9731, 41.5419) -> (-31.4898, 28.5419) centre (0, 0) ccw
  line L6 (-8.9731, 41.5419) -> (-11.7165, 56.2936)
  circle A11 centre (0, 0) radius 57.5 construction
  arc A12 (-11.7165, 56.2936) -> (-42.8934, 38.2936) centre (0, 0) ccw
  circle A13 centre (0, 0) radius 42.5 construction
  line L7 (-40.4629, -13) -> (-54.61, -18)
  arc A14 (-40.4629, 13) -> (-40.4629, -13) centre (0, 0) ccw
  line L8 (-40.4629, 13) -> (-54.61, 18)
  circle A15 centre (0, 0) radius 57.5 construction
  arc A16 (-54.61, 18) -> (-54.61, -18) centre (0, 0) ccw
  circle A17 centre (0, 0) radius 42.5 construction
  line L9 (-8.9731, -41.5419) -> (-11.7165, -56.2936)
  arc A18 (-31.4898, -28.5419) -> (-8.9731, -41.5419) centre (0, 0) ccw
  line L10 (-31.4898, -28.5419) -> (-42.8934, -38.2936)
  circle A19 centre (0, 0) radius 57.5 construction
  arc A20 (-42.8934, -38.2936) -> (-11.7165, -56.2936) centre (0, 0) ccw
  circle A21 centre (0, 0) radius 42.5 construction
  line L11 (31.4898, -28.5419) -> (42.8934, -38.2936)
  arc A22 (8.9731, -41.5419) -> (31.4898, -28.5419) centre (0, 0) ccw
  line L12 (8.9731, -41.5419) -> (11.7165, -56.2936)
  circle A23 centre (0, 0) radius 57.5 construction
  arc A24 (11.7165, -56.2936) -> (42.8934, -38.2936) centre (0, 0) ccw
  dimension "d35" = 85
  dimension "d36" = 115
  dimension "d37" = 13
  dimension "d38" = 18
  dimension "d41" = 360
extrude "Extrusion7" cut sketch "Sketch9" against normal through all
properties part number "SJ002" material "ABS Plastic"
